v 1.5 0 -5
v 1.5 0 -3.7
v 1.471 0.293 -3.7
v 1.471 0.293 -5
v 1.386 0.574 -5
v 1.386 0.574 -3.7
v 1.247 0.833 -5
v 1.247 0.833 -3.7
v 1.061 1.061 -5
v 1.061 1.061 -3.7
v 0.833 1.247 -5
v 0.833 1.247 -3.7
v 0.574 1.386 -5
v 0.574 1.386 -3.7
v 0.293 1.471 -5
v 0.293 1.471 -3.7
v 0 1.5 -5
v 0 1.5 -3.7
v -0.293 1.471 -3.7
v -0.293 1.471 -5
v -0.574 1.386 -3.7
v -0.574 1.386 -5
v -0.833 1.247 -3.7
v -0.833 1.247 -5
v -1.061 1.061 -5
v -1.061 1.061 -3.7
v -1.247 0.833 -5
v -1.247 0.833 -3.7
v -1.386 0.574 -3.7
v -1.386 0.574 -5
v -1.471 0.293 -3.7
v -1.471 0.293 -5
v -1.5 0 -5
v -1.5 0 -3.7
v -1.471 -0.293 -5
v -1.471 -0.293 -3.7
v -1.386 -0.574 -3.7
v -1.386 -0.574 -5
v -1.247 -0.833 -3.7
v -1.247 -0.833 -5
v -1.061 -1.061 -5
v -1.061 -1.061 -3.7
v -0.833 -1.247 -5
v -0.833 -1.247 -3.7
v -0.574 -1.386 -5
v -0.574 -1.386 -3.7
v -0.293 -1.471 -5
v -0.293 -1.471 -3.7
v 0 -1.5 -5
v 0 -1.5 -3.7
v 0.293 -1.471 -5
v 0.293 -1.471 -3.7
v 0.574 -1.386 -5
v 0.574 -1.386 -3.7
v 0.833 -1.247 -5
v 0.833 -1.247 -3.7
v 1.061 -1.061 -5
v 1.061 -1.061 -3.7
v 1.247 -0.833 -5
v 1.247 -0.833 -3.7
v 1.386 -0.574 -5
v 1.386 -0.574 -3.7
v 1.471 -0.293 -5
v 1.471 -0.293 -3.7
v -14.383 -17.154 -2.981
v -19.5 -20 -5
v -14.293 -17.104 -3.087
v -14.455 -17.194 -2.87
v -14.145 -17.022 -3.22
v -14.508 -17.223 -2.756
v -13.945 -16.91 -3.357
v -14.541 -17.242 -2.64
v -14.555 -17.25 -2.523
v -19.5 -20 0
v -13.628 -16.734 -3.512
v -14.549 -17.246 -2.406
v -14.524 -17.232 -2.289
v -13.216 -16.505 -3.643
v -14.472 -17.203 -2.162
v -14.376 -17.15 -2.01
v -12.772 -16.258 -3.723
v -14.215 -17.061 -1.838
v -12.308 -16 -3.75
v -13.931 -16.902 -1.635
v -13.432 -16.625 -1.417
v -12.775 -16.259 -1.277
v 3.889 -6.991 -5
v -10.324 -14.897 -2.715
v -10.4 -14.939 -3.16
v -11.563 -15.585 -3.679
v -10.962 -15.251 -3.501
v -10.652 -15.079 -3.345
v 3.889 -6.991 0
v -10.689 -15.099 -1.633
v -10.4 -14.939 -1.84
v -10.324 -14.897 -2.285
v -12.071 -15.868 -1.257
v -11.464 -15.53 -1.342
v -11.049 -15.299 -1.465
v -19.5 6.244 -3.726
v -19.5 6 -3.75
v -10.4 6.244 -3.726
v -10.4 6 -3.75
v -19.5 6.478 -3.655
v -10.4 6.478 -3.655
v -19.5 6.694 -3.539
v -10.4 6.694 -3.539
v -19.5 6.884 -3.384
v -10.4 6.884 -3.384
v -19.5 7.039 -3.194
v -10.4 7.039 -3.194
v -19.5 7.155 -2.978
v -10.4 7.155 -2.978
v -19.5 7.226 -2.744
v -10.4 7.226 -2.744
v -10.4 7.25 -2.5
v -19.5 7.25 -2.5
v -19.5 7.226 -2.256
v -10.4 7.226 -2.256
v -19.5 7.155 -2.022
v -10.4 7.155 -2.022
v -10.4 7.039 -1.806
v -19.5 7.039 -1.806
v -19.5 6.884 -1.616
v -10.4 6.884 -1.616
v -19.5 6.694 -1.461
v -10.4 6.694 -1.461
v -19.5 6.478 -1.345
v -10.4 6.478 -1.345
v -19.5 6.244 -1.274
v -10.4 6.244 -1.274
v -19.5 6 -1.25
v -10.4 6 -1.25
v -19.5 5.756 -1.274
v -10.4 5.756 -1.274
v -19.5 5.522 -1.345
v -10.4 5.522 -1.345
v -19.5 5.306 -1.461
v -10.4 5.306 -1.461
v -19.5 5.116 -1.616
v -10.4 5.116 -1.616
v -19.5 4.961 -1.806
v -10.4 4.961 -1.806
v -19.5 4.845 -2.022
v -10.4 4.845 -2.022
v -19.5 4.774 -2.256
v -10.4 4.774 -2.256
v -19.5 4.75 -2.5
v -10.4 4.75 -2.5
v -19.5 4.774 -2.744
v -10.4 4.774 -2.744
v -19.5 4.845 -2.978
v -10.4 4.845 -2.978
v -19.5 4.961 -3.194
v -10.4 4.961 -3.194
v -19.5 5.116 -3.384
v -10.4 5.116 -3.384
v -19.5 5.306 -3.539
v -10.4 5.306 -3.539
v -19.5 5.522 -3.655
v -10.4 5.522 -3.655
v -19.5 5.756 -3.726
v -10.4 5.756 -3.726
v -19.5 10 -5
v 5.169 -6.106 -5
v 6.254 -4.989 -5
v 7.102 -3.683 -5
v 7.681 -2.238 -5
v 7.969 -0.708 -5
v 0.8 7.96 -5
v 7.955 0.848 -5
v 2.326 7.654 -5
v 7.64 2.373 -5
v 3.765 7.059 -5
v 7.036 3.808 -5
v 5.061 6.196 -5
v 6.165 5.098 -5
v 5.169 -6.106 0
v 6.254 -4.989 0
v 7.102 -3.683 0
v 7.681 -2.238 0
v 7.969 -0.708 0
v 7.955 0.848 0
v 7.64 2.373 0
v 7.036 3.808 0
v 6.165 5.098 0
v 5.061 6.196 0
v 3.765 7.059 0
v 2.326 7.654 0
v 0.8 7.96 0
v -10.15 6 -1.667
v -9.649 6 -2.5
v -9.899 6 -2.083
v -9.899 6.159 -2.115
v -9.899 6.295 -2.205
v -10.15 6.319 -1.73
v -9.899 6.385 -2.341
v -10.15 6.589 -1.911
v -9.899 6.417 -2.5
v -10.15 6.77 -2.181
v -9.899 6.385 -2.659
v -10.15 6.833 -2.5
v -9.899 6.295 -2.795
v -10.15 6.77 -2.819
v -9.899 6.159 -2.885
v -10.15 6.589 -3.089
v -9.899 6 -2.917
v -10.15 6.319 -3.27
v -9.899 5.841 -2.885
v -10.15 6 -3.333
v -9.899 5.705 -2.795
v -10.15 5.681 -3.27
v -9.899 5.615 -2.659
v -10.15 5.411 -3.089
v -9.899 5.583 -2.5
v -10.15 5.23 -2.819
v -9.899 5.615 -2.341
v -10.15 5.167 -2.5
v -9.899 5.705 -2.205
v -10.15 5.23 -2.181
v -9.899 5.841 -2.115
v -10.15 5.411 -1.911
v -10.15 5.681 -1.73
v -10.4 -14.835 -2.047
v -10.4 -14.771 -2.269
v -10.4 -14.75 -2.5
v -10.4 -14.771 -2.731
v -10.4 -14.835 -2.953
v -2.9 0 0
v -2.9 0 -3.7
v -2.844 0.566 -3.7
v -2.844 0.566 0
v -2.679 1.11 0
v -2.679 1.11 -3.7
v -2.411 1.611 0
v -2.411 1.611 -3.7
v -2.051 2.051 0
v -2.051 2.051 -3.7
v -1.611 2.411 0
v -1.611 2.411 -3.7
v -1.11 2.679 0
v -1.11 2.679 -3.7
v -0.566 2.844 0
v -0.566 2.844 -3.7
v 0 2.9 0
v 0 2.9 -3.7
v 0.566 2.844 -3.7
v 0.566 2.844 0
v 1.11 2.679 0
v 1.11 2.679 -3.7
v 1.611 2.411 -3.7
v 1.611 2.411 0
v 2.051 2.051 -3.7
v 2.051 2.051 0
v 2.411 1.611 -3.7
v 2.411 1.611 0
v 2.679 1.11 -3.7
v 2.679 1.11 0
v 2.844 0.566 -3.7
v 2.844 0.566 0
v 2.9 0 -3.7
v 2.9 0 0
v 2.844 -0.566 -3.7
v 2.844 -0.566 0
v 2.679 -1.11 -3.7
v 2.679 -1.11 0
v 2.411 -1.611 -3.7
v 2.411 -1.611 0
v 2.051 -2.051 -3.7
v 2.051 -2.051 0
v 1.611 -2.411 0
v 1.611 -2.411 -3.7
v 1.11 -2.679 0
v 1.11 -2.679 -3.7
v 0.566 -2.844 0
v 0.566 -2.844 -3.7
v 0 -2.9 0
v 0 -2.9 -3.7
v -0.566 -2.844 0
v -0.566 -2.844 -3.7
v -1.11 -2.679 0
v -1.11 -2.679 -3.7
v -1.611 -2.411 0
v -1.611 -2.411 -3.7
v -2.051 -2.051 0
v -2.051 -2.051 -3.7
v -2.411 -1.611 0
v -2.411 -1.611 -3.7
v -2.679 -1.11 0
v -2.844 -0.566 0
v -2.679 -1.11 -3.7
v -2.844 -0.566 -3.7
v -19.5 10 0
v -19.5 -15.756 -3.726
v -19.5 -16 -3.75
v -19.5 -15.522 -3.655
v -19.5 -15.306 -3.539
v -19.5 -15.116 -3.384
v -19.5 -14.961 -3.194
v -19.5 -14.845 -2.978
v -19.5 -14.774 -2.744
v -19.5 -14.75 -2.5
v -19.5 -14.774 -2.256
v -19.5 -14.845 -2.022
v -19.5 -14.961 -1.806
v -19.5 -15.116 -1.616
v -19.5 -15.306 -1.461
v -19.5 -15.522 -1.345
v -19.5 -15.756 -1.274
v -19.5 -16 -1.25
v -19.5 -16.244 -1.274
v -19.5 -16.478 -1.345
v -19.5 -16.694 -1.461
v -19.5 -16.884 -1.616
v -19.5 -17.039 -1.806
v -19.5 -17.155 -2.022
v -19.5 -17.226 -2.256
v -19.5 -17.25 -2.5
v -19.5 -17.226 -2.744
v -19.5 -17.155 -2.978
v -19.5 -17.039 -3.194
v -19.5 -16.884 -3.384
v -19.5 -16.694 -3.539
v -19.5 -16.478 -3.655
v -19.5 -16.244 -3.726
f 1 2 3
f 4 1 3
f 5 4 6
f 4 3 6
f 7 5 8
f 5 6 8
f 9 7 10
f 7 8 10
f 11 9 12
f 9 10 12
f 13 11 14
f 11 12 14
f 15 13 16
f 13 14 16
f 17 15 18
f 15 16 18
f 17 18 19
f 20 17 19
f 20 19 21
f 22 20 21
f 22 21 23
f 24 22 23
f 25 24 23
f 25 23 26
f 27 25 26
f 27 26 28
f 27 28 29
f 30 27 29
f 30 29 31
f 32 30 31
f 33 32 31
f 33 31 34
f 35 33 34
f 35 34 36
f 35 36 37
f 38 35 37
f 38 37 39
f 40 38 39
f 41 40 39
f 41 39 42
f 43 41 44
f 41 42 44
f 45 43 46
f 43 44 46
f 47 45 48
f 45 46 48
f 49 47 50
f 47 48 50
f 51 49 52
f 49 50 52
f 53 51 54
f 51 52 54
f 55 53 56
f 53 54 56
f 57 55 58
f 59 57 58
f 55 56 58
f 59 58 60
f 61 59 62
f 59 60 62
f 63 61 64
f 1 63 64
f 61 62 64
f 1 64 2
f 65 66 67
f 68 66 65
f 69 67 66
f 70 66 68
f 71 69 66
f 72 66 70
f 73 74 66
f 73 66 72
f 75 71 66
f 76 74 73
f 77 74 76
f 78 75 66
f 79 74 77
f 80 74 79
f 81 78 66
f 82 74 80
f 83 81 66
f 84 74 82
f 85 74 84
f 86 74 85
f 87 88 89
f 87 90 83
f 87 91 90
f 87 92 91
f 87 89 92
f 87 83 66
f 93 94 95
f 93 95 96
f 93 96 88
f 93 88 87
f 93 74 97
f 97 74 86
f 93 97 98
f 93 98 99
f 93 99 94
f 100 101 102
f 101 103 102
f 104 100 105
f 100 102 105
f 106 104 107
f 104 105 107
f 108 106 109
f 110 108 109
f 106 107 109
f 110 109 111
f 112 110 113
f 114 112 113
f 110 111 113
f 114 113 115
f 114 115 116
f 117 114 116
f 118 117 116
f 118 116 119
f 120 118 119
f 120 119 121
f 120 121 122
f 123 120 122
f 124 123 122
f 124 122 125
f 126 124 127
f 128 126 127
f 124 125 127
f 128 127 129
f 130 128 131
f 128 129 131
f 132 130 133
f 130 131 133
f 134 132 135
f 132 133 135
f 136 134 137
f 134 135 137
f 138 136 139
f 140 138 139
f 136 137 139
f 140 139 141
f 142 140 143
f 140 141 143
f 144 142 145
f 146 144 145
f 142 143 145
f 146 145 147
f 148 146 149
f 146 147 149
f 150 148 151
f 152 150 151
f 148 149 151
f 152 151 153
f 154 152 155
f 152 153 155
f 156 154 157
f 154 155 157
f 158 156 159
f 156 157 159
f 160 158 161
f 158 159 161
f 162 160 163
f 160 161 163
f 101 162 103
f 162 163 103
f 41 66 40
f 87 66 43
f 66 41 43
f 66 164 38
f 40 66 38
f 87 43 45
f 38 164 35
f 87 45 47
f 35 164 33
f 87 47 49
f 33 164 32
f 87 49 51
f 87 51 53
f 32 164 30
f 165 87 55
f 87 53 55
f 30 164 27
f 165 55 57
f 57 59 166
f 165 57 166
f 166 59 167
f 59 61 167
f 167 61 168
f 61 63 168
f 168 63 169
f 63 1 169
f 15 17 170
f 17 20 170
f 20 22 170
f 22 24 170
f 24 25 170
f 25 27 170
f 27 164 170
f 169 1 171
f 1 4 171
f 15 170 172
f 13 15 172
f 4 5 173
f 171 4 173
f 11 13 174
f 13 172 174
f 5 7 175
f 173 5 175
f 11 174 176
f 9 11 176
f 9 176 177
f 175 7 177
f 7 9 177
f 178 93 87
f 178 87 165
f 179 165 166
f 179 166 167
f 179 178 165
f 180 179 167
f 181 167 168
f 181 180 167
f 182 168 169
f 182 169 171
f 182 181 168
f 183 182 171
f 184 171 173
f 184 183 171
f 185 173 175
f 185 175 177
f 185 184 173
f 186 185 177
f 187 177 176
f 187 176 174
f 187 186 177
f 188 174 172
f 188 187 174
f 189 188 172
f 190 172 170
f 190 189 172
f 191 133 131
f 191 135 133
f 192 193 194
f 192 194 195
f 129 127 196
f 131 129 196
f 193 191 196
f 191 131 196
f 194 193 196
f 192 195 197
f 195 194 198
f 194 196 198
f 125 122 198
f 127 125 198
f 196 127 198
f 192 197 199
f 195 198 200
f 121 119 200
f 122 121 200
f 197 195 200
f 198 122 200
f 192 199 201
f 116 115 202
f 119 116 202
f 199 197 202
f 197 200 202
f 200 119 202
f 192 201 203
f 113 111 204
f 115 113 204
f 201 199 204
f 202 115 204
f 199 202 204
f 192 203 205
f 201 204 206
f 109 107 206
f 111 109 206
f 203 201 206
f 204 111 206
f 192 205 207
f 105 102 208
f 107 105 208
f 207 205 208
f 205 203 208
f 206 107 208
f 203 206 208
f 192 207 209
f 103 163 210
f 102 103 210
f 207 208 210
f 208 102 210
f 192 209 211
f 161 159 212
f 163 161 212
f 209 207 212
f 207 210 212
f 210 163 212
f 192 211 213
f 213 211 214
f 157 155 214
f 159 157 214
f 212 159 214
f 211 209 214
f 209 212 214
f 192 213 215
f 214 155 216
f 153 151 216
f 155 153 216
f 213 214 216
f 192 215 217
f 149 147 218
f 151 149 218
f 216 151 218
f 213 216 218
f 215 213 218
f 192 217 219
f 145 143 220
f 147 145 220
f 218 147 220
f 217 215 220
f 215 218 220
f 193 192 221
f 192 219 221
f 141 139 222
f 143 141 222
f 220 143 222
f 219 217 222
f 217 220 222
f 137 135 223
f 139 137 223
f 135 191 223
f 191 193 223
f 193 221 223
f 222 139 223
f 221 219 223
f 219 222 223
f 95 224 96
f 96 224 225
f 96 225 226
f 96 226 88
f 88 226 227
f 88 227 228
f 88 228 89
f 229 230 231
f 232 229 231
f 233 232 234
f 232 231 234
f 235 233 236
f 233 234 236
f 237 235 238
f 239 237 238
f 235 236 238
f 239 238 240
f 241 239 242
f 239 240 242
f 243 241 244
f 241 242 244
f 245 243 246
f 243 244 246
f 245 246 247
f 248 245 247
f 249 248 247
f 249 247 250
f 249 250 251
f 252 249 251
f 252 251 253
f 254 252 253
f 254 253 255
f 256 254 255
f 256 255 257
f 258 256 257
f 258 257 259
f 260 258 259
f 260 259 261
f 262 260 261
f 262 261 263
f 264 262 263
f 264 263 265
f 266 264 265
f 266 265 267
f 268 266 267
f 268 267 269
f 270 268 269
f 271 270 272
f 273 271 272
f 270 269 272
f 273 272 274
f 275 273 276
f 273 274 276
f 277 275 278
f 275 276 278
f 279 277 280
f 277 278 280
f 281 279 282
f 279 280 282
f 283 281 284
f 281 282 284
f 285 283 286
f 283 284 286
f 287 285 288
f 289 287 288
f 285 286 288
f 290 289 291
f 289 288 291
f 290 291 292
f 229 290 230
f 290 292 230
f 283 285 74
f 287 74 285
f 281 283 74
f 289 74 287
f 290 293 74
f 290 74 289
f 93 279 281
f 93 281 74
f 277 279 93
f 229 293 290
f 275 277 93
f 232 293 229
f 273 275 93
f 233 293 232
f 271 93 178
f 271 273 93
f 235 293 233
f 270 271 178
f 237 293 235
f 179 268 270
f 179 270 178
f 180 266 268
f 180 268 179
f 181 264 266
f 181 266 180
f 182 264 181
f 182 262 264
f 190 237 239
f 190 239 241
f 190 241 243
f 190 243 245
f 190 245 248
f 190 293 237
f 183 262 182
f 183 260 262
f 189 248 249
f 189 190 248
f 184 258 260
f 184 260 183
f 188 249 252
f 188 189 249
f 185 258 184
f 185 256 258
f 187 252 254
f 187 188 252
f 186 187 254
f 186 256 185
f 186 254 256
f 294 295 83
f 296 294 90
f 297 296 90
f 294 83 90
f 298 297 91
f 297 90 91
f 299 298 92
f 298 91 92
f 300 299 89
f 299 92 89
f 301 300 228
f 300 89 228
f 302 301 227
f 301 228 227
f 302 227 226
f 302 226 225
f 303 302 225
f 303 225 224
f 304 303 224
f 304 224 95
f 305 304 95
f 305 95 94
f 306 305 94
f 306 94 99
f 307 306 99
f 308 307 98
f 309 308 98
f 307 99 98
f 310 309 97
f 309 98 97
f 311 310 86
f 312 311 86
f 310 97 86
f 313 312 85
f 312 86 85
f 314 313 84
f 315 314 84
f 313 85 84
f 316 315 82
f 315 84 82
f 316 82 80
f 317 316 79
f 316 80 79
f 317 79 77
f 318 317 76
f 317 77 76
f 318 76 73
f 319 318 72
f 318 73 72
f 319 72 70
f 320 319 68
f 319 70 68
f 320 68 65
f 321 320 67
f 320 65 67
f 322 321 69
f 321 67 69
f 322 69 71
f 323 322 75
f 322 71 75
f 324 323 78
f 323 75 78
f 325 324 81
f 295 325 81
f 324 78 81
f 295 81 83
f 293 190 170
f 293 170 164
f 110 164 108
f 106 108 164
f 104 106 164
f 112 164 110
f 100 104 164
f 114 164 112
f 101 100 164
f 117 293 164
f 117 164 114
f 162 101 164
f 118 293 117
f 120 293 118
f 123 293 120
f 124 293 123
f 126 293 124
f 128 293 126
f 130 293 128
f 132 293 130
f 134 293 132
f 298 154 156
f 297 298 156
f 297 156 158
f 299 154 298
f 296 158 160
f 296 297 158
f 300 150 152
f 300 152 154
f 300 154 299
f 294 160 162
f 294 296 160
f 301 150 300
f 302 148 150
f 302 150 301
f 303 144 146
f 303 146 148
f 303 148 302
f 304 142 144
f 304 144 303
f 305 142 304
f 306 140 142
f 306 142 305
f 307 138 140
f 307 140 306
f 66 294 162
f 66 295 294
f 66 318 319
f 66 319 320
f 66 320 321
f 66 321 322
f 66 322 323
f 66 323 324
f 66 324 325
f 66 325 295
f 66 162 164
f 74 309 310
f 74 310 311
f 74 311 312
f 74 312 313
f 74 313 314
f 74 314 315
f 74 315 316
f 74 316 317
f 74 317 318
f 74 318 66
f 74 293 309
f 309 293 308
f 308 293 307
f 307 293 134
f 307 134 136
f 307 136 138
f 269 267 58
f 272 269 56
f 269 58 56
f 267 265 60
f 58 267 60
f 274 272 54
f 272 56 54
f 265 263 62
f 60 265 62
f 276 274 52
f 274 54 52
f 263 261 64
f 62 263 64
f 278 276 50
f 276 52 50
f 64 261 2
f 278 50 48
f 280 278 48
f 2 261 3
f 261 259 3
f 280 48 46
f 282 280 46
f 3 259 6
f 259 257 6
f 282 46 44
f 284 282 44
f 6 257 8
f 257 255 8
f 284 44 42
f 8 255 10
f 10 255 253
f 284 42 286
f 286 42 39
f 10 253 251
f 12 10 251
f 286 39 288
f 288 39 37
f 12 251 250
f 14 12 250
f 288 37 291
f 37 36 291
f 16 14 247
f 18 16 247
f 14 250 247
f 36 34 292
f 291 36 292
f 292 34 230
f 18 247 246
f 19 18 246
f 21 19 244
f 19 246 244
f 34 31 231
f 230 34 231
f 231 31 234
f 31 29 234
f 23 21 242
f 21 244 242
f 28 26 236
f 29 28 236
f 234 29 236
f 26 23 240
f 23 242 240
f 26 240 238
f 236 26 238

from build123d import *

# Parameters (mm, degrees)
ESQUISSE1_R               = 1.5
EXTRUSION1_DEPTH          = 5
ESQUISSE2_R               = 2.9
ENL_V_MAT_EXTRU_1_DEPTH   = 29.176940927
TROU_TARAUD_M3X0_51_D     = 2.5
TROU_TARAUD_M3X0_51_DEPTH = 9.1
TROU_TARAUD_M3X0_51_TIP   = 0.751075774


with BuildPart() as part:
    # Esquisse1 → Extrusion1 (new body)
    with BuildSketch(Plane.XY):
        with BuildLine():
            Line((0.799950986, 7.959904423), (-19.5, 10))
            Line((-19.5, 10), (-19.5, -20))
            Line((-19.5, -20), (3.888568512, -6.991354299))
            ThreePointArc((3.888568512, -6.991354299), (7.834576447, 1.618459728), (0.799950986, 7.959904423))
        make_face()
        Circle(ESQUISSE1_R, mode=Mode.SUBTRACT)
    extrude(amount=-EXTRUSION1_DEPTH)

    # Esquisse2 → Enlèv. mat.-Extru.1 (cut, through all)
    with BuildSketch(Plane(origin=(0, 0, -3.7), x_dir=(-1, 0, 0), z_dir=(0, 0, -1))):
        Circle(ESQUISSE2_R)
    extrude(amount=-ENL_V_MAT_EXTRU_1_DEPTH, mode=Mode.SUBTRACT)

    # Trou taraudé M3x0.51
    with Locations(Plane.ZY.offset(19.5)):
        with Locations((-2.5, 6), (-2.5, -16)):
            Hole(TROU_TARAUD_M3X0_51_D / 2, depth=TROU_TARAUD_M3X0_51_DEPTH)
            with Locations((0, 0, -(TROU_TARAUD_M3X0_51_DEPTH + TROU_TARAUD_M3X0_51_TIP / 2))):  # 118° drill point
                Cone(0, TROU_TARAUD_M3X0_51_D / 2, TROU_TARAUD_M3X0_51_TIP, mode=Mode.SUBTRACT)


solid = part.part
